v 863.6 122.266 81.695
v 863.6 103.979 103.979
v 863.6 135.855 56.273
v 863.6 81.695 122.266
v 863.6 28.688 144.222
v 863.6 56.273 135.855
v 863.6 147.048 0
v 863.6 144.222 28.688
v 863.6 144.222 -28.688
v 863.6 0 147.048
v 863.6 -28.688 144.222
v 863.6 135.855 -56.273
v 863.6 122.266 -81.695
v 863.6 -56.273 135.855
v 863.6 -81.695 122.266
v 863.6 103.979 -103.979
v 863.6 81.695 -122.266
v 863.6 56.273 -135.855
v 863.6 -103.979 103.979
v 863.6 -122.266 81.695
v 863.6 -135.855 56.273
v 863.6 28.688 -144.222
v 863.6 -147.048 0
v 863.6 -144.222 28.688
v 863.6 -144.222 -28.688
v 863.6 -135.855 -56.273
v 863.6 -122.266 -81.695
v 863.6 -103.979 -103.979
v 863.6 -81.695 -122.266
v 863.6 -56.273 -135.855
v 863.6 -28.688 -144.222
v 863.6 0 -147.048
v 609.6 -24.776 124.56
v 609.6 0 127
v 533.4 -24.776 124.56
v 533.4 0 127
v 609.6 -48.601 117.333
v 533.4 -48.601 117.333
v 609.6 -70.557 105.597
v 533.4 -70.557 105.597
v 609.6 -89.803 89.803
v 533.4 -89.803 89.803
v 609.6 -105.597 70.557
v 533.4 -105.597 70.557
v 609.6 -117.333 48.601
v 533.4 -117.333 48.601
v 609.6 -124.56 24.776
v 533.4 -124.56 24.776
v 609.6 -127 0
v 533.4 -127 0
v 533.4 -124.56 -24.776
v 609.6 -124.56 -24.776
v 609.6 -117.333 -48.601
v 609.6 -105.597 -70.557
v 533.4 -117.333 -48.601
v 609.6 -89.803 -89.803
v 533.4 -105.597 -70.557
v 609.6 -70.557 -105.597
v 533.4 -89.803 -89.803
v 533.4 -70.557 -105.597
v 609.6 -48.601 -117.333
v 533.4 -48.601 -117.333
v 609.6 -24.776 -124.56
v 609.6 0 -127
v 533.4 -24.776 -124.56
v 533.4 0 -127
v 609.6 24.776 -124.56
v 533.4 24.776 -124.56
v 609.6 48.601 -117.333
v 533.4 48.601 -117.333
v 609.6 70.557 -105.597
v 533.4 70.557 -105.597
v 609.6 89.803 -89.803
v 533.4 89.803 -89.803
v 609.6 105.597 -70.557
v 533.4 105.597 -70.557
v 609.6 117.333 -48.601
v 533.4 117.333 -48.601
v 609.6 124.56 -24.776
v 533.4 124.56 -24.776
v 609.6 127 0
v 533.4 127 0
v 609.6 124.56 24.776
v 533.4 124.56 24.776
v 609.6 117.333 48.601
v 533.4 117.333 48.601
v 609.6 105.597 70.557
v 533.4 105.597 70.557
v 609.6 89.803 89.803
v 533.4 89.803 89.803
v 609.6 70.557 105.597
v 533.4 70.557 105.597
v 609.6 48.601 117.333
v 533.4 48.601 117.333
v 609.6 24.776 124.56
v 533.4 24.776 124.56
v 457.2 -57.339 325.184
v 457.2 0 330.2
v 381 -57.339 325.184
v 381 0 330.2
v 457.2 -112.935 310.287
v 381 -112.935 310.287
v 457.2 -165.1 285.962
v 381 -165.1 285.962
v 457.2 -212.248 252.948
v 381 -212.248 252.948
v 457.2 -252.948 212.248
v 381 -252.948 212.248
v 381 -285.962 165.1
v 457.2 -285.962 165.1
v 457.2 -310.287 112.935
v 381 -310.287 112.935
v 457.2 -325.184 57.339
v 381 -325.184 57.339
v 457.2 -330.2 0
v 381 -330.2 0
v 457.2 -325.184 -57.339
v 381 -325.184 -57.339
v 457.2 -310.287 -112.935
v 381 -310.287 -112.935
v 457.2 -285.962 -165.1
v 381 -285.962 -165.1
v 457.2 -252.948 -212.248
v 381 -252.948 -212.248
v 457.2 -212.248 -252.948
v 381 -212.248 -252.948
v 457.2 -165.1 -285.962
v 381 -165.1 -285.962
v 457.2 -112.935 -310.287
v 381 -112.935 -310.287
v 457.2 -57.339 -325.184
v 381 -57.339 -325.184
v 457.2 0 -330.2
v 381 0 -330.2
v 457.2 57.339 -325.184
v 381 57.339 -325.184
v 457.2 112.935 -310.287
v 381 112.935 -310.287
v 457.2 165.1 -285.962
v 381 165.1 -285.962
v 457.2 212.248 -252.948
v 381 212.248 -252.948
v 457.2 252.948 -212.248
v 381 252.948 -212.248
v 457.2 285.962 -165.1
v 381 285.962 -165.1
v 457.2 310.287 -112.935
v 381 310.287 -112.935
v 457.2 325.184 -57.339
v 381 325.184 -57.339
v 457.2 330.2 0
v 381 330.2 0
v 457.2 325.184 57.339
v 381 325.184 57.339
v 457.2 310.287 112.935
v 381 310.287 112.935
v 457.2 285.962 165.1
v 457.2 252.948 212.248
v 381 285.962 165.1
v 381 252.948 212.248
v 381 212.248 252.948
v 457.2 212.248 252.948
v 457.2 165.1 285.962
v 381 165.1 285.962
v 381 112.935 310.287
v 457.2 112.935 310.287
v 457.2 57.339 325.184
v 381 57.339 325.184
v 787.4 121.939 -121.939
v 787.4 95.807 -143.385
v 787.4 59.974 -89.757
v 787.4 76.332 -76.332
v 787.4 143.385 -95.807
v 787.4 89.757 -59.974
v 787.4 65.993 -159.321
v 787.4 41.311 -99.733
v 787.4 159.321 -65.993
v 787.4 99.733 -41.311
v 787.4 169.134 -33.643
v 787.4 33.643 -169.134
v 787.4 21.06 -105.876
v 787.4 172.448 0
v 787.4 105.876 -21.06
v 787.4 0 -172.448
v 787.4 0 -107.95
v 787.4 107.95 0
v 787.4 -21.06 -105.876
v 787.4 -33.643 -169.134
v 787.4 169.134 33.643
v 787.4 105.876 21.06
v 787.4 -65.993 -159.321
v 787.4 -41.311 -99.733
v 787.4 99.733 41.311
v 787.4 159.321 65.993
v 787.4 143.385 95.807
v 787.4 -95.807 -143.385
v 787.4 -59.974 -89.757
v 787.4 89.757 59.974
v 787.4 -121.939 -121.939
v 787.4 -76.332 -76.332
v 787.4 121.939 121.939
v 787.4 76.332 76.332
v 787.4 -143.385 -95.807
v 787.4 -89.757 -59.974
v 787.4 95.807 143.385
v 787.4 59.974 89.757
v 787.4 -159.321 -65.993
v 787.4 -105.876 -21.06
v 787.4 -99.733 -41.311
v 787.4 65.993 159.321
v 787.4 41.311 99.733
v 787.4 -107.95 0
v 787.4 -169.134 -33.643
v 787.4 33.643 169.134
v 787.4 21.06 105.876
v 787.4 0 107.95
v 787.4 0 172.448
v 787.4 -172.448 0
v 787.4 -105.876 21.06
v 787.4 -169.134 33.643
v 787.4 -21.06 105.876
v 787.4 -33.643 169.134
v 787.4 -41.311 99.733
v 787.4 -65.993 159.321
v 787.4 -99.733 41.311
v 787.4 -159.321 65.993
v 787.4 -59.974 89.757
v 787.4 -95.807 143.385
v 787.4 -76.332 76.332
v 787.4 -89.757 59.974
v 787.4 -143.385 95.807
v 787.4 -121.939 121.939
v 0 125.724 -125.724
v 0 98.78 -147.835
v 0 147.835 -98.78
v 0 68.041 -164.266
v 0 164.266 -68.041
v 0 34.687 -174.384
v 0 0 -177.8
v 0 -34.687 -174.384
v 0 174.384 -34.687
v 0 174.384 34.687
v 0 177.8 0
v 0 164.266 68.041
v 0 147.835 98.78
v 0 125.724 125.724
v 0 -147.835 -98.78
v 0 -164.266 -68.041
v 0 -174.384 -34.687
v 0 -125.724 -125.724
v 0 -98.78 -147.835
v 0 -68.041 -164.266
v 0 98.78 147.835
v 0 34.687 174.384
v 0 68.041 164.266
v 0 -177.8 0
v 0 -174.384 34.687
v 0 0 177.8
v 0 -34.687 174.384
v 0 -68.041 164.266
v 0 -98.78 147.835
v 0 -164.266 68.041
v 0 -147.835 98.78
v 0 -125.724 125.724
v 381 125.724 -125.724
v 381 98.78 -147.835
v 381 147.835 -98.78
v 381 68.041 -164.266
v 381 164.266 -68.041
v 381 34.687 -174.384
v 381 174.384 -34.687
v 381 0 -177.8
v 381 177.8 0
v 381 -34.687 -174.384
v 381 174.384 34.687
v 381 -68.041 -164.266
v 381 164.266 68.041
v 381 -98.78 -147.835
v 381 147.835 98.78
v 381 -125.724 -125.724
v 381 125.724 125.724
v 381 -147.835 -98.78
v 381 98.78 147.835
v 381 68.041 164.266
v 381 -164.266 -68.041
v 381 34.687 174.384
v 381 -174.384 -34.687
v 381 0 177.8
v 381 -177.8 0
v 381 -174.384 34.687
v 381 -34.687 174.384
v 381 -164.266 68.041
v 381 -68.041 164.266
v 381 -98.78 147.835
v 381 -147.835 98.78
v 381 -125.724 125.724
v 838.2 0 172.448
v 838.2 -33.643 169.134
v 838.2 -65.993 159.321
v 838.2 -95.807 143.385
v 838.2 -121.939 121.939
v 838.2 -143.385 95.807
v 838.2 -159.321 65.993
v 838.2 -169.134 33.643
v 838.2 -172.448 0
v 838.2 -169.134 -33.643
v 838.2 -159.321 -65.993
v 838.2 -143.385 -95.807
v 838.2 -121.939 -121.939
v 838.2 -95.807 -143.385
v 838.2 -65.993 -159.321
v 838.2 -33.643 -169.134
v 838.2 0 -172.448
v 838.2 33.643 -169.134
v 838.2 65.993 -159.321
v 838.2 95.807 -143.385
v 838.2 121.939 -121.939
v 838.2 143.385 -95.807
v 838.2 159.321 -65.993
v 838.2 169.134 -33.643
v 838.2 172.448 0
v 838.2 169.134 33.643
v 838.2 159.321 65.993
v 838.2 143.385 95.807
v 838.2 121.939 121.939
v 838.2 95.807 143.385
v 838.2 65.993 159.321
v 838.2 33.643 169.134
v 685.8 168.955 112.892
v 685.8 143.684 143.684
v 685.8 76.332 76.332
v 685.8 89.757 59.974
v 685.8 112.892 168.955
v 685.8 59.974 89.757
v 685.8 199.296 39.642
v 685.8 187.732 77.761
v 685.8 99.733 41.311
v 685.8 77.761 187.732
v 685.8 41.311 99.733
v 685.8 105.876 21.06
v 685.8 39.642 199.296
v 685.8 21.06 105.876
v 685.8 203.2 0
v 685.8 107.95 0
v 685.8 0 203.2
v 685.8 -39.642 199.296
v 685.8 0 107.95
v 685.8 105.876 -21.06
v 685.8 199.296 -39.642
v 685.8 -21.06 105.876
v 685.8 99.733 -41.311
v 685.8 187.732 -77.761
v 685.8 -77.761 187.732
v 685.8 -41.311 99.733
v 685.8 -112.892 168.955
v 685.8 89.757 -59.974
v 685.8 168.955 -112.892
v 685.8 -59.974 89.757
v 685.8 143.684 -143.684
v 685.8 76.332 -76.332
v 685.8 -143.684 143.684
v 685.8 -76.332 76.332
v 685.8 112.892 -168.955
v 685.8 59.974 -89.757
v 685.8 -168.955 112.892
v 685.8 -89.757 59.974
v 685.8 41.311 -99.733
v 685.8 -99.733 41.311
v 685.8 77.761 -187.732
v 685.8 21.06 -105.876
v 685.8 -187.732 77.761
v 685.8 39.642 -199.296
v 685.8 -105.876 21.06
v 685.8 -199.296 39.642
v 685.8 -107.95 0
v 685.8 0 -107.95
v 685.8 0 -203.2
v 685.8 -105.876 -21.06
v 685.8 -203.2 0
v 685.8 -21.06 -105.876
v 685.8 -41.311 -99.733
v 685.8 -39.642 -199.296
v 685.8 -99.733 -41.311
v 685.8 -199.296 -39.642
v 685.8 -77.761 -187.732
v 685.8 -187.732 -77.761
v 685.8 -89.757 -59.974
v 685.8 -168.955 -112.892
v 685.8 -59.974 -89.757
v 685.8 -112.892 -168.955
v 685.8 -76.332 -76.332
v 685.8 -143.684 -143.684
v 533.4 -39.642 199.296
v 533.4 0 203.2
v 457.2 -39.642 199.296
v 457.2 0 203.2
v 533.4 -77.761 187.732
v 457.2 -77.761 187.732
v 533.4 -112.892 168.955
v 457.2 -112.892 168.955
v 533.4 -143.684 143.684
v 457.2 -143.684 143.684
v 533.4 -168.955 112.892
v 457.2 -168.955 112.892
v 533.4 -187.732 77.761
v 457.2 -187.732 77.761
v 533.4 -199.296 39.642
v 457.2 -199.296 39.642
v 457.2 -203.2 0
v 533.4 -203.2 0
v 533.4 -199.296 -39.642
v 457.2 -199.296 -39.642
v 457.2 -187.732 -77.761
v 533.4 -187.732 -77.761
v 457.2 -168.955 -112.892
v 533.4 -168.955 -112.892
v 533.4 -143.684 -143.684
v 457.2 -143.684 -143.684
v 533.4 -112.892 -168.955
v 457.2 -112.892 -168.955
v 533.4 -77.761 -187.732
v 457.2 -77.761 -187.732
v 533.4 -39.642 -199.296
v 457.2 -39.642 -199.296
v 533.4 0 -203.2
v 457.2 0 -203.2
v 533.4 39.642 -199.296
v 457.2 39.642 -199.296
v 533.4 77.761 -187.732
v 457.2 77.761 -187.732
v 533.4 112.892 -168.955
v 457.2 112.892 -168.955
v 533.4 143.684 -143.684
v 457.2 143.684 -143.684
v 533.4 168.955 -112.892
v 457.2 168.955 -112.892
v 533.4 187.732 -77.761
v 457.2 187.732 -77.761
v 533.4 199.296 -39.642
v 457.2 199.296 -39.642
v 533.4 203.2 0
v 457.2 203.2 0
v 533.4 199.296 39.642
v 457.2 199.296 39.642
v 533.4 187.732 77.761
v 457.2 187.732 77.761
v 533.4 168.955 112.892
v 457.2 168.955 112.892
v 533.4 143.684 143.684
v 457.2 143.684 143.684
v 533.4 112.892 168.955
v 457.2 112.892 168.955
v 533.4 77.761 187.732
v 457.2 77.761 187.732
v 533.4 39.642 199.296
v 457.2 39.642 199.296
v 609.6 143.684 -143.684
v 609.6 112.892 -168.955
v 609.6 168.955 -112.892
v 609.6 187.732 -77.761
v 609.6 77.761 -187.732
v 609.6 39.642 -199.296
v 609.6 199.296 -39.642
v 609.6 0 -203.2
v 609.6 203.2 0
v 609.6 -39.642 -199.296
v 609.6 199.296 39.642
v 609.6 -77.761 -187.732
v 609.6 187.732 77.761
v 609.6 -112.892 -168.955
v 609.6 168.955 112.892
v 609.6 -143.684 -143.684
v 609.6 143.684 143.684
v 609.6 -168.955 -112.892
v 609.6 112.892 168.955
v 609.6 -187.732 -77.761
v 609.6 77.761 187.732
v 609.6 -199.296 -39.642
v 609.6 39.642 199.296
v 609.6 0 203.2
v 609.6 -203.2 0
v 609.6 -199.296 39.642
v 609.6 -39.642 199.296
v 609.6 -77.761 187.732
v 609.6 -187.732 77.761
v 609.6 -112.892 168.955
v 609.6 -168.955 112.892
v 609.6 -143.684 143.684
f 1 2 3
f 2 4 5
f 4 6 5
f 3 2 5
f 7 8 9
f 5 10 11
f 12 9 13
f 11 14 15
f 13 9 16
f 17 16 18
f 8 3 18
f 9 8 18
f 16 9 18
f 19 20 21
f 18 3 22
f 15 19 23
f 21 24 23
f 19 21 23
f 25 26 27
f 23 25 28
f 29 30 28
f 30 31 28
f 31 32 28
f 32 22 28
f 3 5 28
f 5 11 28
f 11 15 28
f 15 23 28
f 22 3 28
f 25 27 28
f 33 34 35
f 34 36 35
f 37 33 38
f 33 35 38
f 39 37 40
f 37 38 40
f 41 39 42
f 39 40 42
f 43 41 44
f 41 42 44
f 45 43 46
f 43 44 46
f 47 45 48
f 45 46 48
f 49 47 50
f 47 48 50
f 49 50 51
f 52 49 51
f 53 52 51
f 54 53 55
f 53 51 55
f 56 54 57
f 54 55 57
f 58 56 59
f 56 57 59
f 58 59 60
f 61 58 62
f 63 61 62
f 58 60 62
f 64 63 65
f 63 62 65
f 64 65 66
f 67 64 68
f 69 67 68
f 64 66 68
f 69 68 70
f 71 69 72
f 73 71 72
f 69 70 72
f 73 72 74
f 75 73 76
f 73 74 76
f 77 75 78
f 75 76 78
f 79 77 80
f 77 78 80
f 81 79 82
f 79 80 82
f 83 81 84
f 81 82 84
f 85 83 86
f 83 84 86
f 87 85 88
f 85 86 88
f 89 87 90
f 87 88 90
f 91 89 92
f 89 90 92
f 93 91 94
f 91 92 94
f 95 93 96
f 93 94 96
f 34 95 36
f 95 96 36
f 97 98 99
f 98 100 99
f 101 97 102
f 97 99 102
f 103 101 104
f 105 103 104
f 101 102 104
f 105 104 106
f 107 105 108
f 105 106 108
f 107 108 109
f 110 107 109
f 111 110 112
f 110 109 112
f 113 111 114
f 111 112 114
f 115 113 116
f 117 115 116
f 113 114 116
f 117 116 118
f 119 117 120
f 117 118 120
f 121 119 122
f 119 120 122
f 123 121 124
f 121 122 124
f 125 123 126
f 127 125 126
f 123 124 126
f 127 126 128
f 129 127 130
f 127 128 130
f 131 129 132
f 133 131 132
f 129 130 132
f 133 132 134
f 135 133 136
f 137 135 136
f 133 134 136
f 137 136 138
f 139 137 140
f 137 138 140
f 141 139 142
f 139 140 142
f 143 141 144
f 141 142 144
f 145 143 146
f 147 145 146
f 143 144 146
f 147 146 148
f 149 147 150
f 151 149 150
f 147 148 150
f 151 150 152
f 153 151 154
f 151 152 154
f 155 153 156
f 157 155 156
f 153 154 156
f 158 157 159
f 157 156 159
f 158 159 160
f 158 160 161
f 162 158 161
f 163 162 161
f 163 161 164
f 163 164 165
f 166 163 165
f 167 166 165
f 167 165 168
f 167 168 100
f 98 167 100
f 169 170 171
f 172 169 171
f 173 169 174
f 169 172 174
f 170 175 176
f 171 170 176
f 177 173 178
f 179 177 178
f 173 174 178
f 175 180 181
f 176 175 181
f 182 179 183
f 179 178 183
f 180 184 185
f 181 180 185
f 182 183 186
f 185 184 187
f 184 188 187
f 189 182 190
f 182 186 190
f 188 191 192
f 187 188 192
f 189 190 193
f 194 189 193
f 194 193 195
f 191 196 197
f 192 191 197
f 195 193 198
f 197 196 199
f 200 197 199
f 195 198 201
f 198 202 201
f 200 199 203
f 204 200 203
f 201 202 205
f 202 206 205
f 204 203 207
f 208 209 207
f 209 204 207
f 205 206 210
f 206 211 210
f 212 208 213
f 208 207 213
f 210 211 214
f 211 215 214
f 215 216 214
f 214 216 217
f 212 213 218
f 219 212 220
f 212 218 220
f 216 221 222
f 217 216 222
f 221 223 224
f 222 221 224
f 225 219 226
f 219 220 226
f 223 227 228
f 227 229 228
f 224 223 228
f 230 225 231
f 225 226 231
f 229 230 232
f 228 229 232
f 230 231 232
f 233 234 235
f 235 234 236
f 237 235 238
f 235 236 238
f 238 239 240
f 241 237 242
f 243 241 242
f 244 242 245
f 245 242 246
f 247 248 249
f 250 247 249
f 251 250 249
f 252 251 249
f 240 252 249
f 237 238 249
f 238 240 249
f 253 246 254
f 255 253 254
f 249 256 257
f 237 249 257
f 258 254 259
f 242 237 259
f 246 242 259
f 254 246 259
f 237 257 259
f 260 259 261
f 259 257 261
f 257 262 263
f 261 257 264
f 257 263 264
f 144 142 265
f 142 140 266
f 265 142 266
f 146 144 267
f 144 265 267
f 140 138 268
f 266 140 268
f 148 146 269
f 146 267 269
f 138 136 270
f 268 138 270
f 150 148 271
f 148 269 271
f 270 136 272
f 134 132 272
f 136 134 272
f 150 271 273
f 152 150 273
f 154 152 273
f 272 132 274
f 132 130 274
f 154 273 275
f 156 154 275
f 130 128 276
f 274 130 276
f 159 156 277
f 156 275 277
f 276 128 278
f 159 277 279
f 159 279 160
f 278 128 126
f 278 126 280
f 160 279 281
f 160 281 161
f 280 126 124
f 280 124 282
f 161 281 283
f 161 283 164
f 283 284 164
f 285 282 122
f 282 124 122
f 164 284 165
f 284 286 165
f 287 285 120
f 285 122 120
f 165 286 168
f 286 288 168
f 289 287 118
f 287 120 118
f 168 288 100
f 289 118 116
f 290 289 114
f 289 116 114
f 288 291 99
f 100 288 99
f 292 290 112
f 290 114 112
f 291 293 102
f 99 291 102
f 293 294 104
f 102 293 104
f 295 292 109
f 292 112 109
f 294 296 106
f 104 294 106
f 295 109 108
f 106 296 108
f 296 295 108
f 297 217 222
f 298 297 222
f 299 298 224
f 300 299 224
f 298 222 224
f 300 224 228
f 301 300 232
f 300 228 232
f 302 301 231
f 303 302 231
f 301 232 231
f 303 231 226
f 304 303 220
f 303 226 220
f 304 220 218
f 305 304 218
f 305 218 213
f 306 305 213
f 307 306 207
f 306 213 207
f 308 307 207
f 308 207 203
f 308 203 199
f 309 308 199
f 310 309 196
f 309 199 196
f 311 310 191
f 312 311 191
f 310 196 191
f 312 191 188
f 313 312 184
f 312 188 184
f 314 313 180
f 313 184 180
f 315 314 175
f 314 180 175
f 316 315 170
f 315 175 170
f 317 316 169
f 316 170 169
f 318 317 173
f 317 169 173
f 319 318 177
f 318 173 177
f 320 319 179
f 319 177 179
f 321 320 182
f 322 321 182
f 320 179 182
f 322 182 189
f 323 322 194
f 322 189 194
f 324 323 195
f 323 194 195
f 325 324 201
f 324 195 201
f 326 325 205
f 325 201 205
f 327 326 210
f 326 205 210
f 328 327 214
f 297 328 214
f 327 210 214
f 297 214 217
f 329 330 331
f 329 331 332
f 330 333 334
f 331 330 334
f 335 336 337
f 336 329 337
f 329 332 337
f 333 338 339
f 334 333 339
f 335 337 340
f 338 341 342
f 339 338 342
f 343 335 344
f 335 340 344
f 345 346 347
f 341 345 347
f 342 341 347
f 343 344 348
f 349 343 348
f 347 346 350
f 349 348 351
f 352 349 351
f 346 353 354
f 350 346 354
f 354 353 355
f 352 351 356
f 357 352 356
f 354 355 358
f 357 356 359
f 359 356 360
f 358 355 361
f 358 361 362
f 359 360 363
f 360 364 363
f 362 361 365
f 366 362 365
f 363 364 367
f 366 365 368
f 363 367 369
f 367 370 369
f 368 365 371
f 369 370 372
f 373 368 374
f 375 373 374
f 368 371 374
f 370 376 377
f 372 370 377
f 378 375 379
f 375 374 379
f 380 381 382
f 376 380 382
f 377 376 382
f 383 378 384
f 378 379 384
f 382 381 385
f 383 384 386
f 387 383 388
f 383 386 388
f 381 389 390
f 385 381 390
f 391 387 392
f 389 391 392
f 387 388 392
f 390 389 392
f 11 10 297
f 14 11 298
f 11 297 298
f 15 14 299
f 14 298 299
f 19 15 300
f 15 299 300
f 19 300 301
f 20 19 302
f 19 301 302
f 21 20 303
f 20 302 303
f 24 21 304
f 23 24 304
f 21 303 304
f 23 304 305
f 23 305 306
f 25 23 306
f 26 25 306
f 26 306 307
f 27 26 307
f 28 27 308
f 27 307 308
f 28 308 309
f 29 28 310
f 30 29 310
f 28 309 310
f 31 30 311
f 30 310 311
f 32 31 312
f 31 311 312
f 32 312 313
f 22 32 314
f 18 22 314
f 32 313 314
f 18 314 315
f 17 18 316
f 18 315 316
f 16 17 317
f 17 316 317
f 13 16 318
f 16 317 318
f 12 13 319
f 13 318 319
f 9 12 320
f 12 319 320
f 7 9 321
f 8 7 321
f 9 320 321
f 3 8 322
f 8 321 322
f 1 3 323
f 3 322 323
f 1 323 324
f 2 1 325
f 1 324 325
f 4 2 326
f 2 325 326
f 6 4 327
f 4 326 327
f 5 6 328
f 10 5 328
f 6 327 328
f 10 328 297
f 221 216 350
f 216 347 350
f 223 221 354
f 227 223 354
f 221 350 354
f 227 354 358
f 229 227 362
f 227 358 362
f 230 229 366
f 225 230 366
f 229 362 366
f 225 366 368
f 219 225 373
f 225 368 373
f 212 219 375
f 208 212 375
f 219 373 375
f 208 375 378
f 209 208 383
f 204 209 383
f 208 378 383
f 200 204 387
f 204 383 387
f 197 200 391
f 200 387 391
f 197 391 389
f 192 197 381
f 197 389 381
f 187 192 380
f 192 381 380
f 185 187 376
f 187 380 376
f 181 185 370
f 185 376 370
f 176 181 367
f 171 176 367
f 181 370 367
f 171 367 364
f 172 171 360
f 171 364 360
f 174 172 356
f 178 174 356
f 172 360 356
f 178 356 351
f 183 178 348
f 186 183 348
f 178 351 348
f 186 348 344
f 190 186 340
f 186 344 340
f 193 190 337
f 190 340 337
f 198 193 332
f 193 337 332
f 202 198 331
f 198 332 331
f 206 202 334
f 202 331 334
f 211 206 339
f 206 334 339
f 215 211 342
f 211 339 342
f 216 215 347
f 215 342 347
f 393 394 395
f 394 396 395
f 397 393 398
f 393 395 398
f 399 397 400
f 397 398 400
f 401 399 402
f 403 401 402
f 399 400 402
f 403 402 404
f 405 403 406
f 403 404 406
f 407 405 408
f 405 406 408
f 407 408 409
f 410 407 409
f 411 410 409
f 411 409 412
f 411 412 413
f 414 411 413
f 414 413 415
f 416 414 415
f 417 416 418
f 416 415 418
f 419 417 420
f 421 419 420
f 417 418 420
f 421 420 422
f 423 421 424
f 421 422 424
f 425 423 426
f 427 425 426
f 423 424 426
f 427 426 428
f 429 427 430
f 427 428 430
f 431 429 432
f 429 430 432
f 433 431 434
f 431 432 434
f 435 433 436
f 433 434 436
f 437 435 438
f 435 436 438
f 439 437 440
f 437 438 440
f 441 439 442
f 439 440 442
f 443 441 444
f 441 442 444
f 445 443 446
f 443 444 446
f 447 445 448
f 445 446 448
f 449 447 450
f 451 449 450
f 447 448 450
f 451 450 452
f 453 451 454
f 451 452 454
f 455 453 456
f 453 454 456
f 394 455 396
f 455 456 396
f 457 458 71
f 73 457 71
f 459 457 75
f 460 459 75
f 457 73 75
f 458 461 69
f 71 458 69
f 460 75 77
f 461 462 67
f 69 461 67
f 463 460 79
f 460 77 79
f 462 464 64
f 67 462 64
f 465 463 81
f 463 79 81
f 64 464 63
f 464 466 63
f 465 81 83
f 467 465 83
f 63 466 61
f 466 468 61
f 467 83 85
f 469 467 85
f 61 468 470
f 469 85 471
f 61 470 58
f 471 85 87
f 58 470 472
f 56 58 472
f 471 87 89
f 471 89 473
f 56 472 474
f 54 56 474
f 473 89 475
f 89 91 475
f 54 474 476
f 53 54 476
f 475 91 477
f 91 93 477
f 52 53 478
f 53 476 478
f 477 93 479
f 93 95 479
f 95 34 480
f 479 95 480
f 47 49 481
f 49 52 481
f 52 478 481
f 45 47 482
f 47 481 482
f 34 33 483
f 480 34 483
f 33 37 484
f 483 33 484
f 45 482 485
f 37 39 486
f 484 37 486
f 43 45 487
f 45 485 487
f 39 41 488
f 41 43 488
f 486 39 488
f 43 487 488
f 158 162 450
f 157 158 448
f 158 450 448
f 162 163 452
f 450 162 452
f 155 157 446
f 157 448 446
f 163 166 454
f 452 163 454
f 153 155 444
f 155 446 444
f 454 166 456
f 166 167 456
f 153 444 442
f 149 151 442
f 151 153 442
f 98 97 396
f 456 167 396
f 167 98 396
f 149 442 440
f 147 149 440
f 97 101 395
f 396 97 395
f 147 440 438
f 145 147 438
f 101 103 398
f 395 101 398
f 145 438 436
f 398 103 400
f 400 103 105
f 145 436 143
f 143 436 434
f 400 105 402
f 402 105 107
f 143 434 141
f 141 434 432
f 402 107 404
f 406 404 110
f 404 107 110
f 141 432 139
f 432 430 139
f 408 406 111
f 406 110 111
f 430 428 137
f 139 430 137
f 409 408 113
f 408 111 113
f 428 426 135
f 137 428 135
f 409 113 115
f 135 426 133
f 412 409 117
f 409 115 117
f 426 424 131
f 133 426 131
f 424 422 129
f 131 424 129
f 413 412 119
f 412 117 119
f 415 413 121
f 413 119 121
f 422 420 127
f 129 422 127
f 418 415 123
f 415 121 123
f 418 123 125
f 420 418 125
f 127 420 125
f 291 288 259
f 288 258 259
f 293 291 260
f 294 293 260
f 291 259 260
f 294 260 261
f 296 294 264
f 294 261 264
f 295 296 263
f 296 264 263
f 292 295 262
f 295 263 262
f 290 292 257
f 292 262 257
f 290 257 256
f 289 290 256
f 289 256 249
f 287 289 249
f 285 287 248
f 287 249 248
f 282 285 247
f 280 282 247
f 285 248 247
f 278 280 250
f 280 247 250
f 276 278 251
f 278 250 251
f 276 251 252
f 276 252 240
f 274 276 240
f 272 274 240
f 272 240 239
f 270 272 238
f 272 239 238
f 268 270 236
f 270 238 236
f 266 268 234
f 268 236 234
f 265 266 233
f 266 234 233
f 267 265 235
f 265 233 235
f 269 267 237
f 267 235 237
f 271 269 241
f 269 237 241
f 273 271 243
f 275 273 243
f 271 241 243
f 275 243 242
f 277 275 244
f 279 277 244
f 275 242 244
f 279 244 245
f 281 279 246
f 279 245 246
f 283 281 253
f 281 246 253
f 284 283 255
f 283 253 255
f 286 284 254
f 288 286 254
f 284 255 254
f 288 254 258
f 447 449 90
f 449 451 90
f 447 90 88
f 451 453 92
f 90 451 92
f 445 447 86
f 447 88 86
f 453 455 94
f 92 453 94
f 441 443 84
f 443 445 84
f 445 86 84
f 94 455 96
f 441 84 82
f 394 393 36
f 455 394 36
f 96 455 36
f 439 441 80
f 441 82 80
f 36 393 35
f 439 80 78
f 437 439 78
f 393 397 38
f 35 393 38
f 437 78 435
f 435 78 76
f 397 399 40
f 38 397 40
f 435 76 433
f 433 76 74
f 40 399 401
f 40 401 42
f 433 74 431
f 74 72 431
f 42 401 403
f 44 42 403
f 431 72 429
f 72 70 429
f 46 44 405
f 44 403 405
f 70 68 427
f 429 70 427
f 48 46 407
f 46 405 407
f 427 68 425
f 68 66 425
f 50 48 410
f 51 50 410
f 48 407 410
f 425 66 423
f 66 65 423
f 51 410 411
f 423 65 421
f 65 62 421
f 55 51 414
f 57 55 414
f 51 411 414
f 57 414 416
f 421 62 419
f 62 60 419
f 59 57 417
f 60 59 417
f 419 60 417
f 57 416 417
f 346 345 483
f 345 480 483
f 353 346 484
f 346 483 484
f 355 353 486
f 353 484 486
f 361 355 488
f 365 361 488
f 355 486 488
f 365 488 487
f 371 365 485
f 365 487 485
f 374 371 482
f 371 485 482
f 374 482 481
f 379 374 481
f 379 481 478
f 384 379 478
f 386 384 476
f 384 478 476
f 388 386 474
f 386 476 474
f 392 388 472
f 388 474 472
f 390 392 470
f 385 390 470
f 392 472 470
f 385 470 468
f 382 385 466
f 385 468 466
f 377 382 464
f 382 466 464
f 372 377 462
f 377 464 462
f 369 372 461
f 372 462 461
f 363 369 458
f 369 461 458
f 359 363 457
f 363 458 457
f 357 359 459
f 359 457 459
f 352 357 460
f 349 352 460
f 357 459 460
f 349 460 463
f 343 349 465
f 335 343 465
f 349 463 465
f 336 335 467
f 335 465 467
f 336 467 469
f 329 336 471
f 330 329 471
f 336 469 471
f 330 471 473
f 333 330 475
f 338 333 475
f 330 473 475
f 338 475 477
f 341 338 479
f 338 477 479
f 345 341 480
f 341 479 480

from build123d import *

# Parameters (mm, degrees)
F2_SIZE = 25.4


with BuildPart() as f1:
    # F0 (on Front) → F1 (revolve)
    with BuildSketch(Plane.XZ):
        Polygon((0, 177.8), (0, 0), (863.6, 0), (863.6, 172.44786), (787.4, 172.44786), (787.4, 107.95), (685.8, 107.95), (685.8, 203.2), (609.6, 203.2), (609.6, 127), (533.4, 127), (533.4, 203.2), (457.2, 203.2), (457.2, 330.2), (381, 330.2), (381, 177.8), align=None)
    revolve(axis=Axis((431.8, 0, 0), (1, 0, 0)))

    # F2
    f2_edges = [f1.edges().sort_by_distance(p)[0] for p in [
        (863.6, 0, -172.44786),
    ]]
    chamfer(f2_edges, length=F2_SIZE)


solid = f1.part
